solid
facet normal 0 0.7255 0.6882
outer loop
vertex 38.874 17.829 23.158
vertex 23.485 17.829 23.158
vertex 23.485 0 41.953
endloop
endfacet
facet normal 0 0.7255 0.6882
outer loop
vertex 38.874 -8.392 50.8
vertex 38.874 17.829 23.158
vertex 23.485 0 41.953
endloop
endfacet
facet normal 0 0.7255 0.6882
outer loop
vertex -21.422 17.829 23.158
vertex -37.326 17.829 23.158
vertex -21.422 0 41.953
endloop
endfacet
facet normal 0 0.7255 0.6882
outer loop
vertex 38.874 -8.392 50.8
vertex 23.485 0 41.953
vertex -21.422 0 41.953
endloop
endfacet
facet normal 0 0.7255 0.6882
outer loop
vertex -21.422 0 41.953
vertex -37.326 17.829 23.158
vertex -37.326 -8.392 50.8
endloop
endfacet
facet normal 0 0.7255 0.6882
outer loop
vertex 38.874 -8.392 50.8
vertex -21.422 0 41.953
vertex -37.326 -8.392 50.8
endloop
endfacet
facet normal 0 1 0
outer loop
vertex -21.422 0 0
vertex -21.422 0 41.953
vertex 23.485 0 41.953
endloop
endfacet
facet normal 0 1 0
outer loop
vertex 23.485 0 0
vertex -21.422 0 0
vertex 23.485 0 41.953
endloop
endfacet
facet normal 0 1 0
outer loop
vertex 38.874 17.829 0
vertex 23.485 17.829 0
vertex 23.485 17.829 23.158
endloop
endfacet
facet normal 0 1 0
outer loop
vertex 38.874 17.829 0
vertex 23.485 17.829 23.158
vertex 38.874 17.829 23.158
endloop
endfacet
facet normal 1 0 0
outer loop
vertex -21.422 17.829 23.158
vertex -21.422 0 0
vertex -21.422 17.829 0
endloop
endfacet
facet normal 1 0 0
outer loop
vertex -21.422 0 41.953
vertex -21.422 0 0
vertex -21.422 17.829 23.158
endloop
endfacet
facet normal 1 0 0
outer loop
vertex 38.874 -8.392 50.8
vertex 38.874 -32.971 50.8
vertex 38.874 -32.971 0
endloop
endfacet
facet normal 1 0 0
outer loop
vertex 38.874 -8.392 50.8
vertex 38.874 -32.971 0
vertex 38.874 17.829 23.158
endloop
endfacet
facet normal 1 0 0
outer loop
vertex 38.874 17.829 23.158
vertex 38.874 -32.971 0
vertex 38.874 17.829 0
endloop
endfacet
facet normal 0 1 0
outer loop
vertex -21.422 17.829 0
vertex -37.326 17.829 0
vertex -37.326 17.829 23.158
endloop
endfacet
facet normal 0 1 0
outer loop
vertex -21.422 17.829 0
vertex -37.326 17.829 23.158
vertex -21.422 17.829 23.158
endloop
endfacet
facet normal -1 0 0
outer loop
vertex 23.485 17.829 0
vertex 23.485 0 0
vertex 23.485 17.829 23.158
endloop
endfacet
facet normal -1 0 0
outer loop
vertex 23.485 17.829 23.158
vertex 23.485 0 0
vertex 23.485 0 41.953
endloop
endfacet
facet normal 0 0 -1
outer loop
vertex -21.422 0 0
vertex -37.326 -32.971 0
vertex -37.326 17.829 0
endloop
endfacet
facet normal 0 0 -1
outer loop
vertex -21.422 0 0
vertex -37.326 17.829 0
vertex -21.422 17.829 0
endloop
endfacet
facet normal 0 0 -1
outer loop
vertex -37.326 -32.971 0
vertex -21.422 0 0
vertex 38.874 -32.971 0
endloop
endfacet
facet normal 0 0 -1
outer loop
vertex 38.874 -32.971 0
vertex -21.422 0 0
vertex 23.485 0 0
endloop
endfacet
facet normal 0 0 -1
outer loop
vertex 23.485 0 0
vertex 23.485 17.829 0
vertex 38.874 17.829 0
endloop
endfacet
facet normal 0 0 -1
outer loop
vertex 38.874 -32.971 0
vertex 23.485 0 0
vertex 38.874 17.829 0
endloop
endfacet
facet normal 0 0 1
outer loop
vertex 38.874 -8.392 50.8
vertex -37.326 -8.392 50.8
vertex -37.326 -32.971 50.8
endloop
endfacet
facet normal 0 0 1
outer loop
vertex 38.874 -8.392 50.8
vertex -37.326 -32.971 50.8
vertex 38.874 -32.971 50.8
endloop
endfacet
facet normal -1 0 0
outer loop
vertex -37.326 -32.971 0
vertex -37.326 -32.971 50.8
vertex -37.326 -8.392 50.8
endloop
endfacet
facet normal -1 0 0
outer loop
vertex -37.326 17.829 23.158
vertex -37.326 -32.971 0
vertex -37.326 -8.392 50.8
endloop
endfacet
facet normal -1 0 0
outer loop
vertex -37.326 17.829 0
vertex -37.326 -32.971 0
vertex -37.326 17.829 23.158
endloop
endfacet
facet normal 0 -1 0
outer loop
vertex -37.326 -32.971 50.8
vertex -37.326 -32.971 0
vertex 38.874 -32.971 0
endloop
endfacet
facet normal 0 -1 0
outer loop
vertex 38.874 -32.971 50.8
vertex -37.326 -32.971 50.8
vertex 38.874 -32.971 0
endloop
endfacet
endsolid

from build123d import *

# Parameters (mm, degrees)
F0_W     = 76.2
F0_H     = 50.8
F1_DEPTH = 50.8
F3_DEPTH = 81.788
F4_W     = 44.9072
F4_H     = 51.87745
F5_DEPTH = 47.244


with BuildPart() as f1:
    # F0 (on Top) → F1 (new body)
    with BuildSketch(Plane.XY):
        with Locations((0.774292, -7.57095)):
            Rectangle(F0_W, F0_H)
    extrude(amount=F1_DEPTH)

    # F2 (on face) → F3 (cut)
    with BuildSketch(Plane(origin=(-37.325708, 0, 0), x_dir=(0, -1, 0), z_dir=(-1, 0, 0))):
        Polygon((-17.82905, 23.158375), (8.392135, 50.8), (-17.82905, 50.8), align=None)
    extrude(amount=-F3_DEPTH, mode=Mode.SUBTRACT)

    # F4 (on Front) → F5 (cut)
    with BuildSketch(Plane.XZ):
        with Locations((1.031568, 25.938725)):
            Rectangle(F4_W, F4_H)
    extrude(amount=-F5_DEPTH, mode=Mode.SUBTRACT)


solid = f1.part
